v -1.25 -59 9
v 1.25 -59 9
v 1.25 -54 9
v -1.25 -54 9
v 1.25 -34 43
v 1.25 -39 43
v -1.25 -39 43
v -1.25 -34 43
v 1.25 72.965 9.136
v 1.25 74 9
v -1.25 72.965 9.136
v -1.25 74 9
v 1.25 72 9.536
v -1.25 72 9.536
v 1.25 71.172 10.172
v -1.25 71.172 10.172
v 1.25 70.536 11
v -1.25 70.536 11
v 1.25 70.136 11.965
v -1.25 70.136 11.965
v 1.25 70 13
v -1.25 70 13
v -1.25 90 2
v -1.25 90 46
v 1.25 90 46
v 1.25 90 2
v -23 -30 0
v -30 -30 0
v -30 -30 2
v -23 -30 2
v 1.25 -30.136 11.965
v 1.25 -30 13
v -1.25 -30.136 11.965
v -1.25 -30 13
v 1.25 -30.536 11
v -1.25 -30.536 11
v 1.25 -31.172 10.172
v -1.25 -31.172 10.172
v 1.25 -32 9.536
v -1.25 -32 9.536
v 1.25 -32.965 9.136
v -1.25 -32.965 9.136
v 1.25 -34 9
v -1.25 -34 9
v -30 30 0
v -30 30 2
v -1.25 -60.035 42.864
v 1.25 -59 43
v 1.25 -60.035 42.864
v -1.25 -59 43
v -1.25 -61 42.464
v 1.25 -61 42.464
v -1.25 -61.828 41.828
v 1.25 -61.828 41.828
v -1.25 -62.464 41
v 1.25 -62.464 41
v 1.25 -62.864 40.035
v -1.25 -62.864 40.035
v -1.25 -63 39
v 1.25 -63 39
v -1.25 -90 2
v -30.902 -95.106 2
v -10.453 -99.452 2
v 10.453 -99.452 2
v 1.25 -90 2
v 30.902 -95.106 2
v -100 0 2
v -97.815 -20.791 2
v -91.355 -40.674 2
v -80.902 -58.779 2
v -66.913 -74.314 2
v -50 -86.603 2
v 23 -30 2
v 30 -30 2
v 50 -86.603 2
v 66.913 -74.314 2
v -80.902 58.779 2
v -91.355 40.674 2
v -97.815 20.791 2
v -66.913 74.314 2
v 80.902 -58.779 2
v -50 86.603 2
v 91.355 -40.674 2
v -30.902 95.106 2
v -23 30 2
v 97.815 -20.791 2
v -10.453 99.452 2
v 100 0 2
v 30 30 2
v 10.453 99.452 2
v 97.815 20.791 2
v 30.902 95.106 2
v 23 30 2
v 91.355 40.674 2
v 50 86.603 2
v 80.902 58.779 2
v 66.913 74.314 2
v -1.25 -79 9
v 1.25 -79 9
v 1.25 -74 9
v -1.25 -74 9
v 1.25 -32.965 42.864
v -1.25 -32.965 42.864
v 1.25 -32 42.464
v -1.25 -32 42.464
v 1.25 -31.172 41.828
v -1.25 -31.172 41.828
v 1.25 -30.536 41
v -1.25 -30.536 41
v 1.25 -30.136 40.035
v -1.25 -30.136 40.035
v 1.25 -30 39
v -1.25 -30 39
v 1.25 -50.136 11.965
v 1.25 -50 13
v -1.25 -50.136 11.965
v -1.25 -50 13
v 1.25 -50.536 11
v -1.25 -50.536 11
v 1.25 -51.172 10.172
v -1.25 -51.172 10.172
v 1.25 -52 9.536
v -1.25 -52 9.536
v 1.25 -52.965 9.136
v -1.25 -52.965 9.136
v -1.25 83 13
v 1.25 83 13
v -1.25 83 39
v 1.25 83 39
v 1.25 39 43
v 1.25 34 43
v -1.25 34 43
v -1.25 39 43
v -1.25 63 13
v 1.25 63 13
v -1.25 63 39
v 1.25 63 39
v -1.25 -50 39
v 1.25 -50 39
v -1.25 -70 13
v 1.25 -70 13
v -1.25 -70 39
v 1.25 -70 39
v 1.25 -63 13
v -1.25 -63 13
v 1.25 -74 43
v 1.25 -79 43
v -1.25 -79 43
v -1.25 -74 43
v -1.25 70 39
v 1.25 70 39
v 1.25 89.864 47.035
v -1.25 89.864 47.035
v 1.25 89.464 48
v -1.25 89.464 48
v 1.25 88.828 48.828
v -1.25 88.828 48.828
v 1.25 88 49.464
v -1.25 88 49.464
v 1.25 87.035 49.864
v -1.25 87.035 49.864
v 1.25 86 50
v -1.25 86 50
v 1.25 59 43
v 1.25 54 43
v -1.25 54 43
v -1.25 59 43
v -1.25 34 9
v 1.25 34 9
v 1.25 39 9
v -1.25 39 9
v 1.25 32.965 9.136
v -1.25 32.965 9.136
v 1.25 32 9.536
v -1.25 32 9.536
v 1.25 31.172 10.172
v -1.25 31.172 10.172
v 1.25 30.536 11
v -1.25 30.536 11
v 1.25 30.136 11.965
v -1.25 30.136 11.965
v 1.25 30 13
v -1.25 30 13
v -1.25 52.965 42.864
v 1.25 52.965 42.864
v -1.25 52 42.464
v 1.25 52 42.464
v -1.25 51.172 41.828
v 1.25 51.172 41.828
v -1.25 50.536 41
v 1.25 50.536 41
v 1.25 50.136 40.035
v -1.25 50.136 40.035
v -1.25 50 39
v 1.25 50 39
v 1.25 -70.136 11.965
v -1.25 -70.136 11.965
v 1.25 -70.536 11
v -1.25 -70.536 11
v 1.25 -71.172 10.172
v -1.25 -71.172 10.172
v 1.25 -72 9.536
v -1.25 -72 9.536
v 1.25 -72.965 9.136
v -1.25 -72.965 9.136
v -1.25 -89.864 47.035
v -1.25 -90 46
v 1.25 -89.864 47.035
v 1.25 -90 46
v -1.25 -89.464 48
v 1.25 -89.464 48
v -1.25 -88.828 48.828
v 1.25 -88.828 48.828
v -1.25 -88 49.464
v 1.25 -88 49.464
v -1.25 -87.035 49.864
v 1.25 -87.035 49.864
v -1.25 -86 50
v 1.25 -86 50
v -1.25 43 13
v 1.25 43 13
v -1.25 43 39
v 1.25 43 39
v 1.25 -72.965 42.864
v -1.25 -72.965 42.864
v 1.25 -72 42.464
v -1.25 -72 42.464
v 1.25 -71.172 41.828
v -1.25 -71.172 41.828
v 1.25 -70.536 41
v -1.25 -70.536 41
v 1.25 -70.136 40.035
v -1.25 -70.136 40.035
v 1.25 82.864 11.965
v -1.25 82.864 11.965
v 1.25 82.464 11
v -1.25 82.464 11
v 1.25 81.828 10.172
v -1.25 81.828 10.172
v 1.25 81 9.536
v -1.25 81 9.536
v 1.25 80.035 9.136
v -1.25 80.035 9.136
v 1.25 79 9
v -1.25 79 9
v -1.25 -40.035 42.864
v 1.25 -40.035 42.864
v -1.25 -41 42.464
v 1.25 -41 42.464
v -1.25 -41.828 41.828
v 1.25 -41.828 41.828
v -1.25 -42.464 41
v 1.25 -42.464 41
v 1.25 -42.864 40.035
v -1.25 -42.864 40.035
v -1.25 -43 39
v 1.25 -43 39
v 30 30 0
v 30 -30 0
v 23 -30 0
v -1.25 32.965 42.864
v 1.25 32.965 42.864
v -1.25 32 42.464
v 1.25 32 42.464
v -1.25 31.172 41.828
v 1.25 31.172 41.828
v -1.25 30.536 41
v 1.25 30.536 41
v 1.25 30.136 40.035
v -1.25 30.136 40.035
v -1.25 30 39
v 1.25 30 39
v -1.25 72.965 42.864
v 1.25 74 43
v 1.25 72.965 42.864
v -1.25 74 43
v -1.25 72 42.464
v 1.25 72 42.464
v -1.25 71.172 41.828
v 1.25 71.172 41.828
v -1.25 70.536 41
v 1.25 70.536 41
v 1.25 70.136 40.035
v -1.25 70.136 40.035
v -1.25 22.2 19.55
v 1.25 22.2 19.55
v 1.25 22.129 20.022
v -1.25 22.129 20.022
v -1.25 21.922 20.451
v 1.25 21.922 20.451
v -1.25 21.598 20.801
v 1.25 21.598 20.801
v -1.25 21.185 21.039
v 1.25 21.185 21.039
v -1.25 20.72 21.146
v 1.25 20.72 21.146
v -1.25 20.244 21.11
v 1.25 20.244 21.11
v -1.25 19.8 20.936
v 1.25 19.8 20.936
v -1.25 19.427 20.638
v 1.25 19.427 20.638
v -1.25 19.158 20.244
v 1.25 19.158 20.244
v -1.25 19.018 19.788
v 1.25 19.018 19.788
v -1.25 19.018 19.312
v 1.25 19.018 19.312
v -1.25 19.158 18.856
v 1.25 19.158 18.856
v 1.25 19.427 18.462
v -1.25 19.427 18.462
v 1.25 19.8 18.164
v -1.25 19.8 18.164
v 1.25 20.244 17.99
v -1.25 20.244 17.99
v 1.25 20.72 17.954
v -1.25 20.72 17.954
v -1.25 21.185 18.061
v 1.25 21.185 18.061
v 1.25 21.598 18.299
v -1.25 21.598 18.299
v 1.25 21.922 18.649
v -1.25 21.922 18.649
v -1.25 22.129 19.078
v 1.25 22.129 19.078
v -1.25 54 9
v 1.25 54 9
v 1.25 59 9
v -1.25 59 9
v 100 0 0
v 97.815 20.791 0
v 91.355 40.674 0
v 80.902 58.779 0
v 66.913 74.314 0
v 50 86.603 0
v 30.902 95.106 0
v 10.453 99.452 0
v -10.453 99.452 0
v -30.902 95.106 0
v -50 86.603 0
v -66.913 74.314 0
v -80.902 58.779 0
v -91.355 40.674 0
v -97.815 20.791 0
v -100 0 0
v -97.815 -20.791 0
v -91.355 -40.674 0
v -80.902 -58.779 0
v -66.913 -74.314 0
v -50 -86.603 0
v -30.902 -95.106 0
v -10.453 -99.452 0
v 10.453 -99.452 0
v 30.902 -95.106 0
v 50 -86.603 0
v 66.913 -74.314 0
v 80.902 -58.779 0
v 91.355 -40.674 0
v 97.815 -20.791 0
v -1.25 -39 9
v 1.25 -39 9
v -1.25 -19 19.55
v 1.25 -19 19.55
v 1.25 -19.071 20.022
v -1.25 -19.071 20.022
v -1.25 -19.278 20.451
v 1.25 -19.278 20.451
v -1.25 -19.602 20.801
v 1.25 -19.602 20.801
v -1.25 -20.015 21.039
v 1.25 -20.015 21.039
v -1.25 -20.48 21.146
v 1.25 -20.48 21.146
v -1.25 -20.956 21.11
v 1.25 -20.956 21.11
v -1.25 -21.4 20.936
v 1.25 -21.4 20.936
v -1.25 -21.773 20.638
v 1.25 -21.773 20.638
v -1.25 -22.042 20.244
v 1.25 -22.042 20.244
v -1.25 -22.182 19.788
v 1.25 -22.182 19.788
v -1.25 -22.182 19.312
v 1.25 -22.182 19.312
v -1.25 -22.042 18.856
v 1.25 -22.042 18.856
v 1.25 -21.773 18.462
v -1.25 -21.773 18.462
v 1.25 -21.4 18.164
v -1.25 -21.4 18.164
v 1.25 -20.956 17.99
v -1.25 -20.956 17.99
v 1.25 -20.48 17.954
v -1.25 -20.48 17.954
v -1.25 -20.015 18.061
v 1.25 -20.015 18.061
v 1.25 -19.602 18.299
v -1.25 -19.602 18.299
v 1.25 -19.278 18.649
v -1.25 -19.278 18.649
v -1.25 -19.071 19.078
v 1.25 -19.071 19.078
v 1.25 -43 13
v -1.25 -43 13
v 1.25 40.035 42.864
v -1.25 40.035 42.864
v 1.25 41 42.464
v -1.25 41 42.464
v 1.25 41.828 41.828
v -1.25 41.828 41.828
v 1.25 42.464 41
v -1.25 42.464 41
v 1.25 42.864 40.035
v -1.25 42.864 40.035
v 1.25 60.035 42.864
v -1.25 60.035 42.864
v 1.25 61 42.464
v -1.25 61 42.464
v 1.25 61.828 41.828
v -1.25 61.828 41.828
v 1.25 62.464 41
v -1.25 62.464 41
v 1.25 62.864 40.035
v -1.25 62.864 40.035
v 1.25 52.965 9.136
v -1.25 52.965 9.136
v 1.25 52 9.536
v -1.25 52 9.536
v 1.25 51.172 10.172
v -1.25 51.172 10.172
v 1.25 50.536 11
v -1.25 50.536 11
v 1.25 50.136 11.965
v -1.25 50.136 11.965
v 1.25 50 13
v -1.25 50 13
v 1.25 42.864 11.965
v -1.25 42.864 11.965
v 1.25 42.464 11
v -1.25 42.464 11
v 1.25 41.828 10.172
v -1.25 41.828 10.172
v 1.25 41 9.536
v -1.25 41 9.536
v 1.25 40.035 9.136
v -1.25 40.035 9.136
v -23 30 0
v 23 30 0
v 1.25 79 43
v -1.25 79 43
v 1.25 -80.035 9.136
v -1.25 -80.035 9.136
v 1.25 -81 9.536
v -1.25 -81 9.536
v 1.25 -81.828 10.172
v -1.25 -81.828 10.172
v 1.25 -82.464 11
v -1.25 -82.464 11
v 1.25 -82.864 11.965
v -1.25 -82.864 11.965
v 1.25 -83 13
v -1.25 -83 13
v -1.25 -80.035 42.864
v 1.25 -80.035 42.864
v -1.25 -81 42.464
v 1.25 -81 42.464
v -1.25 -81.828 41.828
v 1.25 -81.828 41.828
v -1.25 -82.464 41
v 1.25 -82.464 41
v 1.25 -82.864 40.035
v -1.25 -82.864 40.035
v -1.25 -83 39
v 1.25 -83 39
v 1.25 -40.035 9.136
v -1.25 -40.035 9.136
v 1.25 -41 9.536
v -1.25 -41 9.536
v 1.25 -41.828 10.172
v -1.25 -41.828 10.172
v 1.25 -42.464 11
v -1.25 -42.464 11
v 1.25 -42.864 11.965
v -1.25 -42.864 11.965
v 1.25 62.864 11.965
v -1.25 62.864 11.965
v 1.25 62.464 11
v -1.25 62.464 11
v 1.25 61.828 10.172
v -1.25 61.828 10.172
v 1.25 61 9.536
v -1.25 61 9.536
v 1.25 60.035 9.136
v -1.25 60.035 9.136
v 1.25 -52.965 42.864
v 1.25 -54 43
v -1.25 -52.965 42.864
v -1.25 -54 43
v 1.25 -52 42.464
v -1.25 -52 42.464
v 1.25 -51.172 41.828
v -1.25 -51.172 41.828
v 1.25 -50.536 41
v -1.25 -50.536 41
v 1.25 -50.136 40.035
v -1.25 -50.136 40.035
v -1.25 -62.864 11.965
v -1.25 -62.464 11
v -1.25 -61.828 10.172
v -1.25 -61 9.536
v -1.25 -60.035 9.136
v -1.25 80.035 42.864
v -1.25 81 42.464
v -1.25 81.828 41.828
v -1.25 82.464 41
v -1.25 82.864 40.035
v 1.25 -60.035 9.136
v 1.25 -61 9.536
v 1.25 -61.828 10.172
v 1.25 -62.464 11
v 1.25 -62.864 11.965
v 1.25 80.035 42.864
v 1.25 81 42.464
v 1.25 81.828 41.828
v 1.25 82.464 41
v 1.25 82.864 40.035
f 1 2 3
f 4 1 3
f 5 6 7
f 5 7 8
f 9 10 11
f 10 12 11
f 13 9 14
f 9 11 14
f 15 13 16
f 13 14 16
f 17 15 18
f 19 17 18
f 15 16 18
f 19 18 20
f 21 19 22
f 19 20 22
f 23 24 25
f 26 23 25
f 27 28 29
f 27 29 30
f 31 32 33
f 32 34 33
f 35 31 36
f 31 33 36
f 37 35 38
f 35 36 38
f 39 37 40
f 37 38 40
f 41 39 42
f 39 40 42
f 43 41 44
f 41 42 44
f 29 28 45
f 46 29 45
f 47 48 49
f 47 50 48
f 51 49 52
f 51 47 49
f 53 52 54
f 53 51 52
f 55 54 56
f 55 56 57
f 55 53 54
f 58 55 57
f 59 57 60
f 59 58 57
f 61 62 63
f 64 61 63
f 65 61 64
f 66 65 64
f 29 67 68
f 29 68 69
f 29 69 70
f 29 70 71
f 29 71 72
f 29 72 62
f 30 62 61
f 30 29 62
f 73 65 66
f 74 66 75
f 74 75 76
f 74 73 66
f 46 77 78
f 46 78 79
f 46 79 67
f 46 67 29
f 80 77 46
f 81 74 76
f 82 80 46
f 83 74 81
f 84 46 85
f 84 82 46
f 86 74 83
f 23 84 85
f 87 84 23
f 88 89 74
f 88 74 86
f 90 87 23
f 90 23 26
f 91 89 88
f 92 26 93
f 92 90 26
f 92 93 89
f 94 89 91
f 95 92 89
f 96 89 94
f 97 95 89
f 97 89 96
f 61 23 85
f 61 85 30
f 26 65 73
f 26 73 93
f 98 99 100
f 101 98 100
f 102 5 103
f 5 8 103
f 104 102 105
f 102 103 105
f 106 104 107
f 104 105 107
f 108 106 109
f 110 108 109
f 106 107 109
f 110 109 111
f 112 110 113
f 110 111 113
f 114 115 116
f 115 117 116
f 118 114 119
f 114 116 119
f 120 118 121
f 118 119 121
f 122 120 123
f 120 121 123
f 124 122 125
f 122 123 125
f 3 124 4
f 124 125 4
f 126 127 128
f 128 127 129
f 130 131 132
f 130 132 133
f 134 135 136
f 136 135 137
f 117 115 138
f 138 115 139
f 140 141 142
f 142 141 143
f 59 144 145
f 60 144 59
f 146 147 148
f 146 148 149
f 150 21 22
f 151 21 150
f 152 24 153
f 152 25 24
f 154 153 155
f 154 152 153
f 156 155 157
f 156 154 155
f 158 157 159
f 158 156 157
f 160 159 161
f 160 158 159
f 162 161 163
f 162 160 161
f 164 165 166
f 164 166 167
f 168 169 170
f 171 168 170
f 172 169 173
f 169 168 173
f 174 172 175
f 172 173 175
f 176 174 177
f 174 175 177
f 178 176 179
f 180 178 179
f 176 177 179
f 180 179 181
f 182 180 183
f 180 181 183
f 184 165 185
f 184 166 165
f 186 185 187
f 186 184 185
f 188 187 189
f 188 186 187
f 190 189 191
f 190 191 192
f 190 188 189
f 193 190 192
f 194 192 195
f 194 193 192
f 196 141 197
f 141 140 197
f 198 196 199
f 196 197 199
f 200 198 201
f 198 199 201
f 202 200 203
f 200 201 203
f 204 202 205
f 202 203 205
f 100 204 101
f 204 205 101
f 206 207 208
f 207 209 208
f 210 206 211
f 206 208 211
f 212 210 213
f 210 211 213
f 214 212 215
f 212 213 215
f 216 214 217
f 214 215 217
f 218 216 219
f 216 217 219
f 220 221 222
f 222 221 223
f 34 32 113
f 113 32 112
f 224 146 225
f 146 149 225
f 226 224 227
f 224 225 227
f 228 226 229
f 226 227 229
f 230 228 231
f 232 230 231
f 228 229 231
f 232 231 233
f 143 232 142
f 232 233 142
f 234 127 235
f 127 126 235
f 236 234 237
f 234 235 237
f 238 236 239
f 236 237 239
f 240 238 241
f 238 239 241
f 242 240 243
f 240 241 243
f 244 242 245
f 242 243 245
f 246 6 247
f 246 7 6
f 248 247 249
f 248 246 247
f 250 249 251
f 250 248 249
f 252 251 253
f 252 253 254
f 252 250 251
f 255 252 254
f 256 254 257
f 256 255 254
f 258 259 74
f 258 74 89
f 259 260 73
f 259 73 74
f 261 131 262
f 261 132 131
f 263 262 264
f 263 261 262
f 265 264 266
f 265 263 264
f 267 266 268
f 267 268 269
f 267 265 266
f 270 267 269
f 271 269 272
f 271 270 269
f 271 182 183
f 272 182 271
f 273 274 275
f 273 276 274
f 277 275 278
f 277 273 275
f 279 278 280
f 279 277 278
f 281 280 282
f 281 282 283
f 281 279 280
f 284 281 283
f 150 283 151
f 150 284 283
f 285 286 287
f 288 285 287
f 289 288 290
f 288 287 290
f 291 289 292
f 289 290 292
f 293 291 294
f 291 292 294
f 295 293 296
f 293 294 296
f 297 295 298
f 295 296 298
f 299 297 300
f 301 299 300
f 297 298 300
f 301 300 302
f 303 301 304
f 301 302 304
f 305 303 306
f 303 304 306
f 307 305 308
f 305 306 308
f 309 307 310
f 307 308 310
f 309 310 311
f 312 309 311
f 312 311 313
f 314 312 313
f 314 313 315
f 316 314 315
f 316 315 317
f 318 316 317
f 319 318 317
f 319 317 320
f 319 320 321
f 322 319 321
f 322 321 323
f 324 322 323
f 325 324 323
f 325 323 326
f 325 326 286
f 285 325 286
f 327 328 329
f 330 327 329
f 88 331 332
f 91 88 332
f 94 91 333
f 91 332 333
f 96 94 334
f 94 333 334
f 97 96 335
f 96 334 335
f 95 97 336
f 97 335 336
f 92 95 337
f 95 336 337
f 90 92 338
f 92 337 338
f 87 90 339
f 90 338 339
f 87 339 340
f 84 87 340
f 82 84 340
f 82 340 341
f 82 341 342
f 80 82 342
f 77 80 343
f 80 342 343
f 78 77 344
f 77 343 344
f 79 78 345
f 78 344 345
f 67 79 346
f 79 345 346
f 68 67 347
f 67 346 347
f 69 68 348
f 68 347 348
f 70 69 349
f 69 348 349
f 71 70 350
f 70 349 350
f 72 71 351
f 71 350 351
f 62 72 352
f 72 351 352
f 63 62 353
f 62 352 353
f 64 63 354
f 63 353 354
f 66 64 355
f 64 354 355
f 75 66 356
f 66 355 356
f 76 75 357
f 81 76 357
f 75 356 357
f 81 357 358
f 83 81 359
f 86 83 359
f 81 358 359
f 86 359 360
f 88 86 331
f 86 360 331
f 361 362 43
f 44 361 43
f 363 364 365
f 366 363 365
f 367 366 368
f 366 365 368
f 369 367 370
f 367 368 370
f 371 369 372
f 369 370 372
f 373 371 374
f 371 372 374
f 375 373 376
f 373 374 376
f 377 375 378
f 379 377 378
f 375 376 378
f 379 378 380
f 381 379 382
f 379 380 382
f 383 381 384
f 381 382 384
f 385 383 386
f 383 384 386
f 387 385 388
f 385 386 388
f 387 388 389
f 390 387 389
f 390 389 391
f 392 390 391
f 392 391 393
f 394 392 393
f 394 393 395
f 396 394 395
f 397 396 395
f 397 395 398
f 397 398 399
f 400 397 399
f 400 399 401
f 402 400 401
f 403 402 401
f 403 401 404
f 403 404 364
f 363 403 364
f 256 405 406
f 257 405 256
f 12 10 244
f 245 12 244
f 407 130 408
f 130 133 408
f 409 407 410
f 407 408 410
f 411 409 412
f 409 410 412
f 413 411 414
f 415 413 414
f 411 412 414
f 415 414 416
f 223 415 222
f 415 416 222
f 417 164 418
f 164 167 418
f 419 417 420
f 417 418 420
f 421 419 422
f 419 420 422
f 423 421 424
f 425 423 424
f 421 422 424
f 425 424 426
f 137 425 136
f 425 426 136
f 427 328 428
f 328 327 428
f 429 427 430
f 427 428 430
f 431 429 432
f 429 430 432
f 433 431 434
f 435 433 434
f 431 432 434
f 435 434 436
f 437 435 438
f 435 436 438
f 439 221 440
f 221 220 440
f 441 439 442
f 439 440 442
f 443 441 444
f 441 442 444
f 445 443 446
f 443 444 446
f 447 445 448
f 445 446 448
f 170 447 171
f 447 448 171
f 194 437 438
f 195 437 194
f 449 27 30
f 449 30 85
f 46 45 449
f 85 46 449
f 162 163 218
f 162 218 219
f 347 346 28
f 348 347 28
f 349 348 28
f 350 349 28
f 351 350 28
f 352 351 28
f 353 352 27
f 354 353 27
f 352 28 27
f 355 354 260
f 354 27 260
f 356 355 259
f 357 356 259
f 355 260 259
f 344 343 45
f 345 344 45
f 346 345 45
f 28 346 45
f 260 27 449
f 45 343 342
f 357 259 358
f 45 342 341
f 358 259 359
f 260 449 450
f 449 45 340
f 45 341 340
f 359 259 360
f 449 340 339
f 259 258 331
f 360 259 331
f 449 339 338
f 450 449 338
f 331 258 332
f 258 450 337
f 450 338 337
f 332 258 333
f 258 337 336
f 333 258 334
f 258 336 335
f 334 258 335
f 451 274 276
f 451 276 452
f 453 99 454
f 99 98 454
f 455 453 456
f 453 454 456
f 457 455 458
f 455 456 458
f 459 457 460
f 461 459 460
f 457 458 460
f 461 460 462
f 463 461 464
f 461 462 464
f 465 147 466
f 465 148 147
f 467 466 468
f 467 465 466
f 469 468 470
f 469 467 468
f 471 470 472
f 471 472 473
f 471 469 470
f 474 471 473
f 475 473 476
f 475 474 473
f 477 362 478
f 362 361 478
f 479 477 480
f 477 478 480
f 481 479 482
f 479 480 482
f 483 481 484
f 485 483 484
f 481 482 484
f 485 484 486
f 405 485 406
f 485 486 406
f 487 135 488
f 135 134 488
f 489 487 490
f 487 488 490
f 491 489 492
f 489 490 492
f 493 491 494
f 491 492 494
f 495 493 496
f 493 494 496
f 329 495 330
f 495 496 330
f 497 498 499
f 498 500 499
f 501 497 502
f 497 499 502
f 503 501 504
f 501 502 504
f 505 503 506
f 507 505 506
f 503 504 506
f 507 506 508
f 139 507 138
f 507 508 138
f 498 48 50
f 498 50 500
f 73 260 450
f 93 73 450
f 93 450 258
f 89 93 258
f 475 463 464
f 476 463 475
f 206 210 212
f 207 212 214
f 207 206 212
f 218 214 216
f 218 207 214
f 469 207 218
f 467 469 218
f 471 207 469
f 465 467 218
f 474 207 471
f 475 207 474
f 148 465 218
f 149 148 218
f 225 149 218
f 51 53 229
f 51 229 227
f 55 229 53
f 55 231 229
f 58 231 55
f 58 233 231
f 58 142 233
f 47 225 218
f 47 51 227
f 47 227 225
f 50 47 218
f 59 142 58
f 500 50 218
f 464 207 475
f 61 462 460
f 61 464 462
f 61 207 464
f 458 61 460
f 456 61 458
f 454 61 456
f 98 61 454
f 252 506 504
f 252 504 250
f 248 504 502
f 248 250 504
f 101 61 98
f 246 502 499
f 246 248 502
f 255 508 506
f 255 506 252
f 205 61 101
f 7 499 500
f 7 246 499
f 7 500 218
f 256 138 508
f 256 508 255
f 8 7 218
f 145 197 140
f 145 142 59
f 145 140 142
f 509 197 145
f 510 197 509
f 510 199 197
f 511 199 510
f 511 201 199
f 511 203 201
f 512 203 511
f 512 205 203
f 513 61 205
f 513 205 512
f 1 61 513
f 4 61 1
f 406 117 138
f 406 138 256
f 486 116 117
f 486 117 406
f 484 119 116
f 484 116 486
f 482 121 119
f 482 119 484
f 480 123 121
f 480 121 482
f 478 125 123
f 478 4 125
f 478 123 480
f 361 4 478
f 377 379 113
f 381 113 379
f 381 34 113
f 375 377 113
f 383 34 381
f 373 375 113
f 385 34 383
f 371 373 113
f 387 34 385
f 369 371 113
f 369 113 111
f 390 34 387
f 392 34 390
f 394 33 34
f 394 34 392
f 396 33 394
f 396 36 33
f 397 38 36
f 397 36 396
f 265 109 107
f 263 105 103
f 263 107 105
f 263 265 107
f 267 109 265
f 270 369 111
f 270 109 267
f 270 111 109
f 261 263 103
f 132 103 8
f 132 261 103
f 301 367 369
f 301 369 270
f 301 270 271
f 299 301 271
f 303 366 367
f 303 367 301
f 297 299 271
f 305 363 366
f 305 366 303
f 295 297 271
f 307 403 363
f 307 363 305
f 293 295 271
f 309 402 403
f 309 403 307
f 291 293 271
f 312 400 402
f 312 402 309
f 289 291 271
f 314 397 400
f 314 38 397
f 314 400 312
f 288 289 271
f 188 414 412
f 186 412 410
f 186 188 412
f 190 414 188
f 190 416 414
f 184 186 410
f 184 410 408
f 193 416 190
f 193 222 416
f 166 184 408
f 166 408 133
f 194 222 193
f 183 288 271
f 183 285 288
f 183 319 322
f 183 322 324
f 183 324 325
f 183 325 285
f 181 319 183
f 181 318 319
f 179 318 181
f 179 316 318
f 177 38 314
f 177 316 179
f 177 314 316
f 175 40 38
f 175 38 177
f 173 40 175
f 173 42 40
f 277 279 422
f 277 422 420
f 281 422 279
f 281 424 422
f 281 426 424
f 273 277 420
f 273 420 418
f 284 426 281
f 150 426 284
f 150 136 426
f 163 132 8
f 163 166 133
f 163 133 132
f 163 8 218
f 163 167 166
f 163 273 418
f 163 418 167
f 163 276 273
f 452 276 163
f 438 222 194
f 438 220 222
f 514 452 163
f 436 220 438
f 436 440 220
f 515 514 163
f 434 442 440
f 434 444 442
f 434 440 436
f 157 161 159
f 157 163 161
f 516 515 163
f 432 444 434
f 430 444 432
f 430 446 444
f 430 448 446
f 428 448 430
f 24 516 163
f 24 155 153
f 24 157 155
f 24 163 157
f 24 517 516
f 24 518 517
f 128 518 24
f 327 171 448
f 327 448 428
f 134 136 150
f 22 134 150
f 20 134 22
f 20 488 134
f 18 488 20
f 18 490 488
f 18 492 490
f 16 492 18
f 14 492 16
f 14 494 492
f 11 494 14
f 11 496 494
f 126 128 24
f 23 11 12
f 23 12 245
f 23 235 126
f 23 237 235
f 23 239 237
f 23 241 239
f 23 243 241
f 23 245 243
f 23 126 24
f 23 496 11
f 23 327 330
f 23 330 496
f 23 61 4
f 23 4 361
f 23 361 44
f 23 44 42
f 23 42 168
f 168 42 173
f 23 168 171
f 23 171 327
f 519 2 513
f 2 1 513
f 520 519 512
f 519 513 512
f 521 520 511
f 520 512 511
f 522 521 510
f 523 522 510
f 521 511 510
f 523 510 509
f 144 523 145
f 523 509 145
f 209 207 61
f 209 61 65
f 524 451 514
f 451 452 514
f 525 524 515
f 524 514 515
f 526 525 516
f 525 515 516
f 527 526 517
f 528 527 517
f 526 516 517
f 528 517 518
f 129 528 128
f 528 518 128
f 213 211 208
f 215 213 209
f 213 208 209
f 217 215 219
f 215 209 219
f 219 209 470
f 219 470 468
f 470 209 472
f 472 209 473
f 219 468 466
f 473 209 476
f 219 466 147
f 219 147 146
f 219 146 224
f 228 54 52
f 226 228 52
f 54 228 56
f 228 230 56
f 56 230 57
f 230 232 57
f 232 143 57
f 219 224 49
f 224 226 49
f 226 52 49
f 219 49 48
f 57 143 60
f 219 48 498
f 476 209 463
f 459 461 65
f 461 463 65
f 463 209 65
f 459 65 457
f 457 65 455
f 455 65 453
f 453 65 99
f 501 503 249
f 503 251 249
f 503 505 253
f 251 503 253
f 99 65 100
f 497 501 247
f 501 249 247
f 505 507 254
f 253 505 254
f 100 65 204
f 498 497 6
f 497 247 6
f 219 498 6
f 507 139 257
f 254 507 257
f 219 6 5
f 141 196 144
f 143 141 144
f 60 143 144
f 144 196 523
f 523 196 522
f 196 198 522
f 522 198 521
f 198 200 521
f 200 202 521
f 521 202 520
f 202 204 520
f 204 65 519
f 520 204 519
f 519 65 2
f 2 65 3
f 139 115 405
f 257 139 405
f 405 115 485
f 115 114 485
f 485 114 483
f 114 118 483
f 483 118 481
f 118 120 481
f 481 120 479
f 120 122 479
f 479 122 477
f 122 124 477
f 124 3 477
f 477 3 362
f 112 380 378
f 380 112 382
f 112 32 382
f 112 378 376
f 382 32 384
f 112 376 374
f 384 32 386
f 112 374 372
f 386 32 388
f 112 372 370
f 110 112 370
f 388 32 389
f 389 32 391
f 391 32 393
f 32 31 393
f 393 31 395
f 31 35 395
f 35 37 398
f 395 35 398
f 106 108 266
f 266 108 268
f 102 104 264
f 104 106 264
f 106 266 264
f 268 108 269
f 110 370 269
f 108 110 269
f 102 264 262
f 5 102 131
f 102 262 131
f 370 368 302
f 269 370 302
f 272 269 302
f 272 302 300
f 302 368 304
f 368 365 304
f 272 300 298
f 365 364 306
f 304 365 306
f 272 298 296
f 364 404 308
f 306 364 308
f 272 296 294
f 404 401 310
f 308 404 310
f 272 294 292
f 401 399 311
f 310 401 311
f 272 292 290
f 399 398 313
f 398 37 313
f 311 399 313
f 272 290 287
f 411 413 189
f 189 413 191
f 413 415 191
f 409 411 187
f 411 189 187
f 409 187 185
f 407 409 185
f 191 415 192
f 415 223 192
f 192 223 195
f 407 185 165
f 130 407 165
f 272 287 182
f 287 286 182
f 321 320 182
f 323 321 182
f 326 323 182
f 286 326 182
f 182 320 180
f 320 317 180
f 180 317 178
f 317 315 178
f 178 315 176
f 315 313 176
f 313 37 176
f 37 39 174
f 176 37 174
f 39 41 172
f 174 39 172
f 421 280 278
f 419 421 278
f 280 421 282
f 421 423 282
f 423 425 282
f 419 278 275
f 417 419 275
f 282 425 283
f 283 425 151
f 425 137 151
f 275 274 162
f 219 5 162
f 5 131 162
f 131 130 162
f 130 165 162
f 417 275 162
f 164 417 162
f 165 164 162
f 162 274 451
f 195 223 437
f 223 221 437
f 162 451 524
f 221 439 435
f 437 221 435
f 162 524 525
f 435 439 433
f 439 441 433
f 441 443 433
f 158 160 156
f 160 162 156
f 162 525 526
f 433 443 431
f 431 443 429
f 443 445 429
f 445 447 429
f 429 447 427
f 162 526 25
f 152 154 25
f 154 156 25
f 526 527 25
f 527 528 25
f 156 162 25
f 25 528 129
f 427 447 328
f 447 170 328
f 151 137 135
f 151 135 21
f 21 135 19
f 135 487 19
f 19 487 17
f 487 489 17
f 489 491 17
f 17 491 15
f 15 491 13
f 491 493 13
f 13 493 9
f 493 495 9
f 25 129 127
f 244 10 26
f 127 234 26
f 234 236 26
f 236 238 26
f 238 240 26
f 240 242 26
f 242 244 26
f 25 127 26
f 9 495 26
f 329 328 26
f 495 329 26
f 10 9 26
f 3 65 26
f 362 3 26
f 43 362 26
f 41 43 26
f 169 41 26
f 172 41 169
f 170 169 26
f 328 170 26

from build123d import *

# Parameters (mm, degrees)
F0_R     = 100
F0_W     = 7
F0_H     = 60
F0_W_2   = 2.5
F0_H_2   = 180
F1_DEPTH = 2
F2_DEPTH = 50
F3_R     = 1.6
F3_W     = 13
F3_H     = 34
F4_DEPTH = 4
F5_R     = 4


with BuildPart() as f1:
    # F0 (on Top) → F1 (new body)
    with BuildSketch(Plane.XY):
        Circle(F0_R)
        with Locations((-26.5, 0)):
            Rectangle(F0_W, F0_H, mode=Mode.SUBTRACT)
        Rectangle(F0_W_2, F0_H_2, mode=Mode.SUBTRACT)
        with Locations((26.5, 0)):
            Rectangle(F0_W, F0_H, mode=Mode.SUBTRACT)
    extrude(amount=F1_DEPTH)

    # F0 (on Top) → F2 (join)
    with BuildSketch(Plane.XY):
        Rectangle(F0_W_2, F0_H_2)
    extrude(amount=F2_DEPTH)

    # F3 (on face) → F4 (cut)
    with BuildSketch(Plane.YZ.offset(1.25)):
        with Locations((-20.6, 19.55)):
            Circle(F3_R)
        with Locations((20.6, 19.55)):
            Circle(F3_R)
        with Locations((-76.5, 26)):
            Rectangle(F3_W, F3_H)
        with Locations((-56.5, 26)):
            Rectangle(F3_W, F3_H)
        with Locations((-36.5, 26)):
            Rectangle(F3_W, F3_H)
        with Locations((76.5, 26)):
            Rectangle(F3_W, F3_H)
        with Locations((56.5, 26)):
            Rectangle(F3_W, F3_H)
        with Locations((36.5, 26)):
            Rectangle(F3_W, F3_H)
    extrude(amount=-F4_DEPTH, mode=Mode.SUBTRACT)

    # F5
    f5_edges = [f1.edges().sort_by_distance(p)[0] for p in [
        (0, -90, 50),
        (0, 90, 50),
        (0, 50, 9),
        (0, 63, 9),
        (0, 83, 9),
        (0, 70, 9),
        (0, 30, 9),
        (0, -43, 9),
        (0, 83, 43),
        (0, 63, 43),
        (0, 43, 43),
        (0, -30, 43),
        (0, -50, 43),
        (0, -70, 43),
        (0, -70, 9),
        (0, -50, 9),
        (0, -30, 9),
        (0, -63, 9),
        (0, -83, 9),
        (0, 70, 43),
        (0, 50, 43),
        (0, 30, 43),
        (0, -63, 43),
        (0, -43, 43),
        (0, -83, 43),
        (0, 43, 9),
    ]]
    fillet(f5_edges, radius=F5_R)


solid = f1.part
